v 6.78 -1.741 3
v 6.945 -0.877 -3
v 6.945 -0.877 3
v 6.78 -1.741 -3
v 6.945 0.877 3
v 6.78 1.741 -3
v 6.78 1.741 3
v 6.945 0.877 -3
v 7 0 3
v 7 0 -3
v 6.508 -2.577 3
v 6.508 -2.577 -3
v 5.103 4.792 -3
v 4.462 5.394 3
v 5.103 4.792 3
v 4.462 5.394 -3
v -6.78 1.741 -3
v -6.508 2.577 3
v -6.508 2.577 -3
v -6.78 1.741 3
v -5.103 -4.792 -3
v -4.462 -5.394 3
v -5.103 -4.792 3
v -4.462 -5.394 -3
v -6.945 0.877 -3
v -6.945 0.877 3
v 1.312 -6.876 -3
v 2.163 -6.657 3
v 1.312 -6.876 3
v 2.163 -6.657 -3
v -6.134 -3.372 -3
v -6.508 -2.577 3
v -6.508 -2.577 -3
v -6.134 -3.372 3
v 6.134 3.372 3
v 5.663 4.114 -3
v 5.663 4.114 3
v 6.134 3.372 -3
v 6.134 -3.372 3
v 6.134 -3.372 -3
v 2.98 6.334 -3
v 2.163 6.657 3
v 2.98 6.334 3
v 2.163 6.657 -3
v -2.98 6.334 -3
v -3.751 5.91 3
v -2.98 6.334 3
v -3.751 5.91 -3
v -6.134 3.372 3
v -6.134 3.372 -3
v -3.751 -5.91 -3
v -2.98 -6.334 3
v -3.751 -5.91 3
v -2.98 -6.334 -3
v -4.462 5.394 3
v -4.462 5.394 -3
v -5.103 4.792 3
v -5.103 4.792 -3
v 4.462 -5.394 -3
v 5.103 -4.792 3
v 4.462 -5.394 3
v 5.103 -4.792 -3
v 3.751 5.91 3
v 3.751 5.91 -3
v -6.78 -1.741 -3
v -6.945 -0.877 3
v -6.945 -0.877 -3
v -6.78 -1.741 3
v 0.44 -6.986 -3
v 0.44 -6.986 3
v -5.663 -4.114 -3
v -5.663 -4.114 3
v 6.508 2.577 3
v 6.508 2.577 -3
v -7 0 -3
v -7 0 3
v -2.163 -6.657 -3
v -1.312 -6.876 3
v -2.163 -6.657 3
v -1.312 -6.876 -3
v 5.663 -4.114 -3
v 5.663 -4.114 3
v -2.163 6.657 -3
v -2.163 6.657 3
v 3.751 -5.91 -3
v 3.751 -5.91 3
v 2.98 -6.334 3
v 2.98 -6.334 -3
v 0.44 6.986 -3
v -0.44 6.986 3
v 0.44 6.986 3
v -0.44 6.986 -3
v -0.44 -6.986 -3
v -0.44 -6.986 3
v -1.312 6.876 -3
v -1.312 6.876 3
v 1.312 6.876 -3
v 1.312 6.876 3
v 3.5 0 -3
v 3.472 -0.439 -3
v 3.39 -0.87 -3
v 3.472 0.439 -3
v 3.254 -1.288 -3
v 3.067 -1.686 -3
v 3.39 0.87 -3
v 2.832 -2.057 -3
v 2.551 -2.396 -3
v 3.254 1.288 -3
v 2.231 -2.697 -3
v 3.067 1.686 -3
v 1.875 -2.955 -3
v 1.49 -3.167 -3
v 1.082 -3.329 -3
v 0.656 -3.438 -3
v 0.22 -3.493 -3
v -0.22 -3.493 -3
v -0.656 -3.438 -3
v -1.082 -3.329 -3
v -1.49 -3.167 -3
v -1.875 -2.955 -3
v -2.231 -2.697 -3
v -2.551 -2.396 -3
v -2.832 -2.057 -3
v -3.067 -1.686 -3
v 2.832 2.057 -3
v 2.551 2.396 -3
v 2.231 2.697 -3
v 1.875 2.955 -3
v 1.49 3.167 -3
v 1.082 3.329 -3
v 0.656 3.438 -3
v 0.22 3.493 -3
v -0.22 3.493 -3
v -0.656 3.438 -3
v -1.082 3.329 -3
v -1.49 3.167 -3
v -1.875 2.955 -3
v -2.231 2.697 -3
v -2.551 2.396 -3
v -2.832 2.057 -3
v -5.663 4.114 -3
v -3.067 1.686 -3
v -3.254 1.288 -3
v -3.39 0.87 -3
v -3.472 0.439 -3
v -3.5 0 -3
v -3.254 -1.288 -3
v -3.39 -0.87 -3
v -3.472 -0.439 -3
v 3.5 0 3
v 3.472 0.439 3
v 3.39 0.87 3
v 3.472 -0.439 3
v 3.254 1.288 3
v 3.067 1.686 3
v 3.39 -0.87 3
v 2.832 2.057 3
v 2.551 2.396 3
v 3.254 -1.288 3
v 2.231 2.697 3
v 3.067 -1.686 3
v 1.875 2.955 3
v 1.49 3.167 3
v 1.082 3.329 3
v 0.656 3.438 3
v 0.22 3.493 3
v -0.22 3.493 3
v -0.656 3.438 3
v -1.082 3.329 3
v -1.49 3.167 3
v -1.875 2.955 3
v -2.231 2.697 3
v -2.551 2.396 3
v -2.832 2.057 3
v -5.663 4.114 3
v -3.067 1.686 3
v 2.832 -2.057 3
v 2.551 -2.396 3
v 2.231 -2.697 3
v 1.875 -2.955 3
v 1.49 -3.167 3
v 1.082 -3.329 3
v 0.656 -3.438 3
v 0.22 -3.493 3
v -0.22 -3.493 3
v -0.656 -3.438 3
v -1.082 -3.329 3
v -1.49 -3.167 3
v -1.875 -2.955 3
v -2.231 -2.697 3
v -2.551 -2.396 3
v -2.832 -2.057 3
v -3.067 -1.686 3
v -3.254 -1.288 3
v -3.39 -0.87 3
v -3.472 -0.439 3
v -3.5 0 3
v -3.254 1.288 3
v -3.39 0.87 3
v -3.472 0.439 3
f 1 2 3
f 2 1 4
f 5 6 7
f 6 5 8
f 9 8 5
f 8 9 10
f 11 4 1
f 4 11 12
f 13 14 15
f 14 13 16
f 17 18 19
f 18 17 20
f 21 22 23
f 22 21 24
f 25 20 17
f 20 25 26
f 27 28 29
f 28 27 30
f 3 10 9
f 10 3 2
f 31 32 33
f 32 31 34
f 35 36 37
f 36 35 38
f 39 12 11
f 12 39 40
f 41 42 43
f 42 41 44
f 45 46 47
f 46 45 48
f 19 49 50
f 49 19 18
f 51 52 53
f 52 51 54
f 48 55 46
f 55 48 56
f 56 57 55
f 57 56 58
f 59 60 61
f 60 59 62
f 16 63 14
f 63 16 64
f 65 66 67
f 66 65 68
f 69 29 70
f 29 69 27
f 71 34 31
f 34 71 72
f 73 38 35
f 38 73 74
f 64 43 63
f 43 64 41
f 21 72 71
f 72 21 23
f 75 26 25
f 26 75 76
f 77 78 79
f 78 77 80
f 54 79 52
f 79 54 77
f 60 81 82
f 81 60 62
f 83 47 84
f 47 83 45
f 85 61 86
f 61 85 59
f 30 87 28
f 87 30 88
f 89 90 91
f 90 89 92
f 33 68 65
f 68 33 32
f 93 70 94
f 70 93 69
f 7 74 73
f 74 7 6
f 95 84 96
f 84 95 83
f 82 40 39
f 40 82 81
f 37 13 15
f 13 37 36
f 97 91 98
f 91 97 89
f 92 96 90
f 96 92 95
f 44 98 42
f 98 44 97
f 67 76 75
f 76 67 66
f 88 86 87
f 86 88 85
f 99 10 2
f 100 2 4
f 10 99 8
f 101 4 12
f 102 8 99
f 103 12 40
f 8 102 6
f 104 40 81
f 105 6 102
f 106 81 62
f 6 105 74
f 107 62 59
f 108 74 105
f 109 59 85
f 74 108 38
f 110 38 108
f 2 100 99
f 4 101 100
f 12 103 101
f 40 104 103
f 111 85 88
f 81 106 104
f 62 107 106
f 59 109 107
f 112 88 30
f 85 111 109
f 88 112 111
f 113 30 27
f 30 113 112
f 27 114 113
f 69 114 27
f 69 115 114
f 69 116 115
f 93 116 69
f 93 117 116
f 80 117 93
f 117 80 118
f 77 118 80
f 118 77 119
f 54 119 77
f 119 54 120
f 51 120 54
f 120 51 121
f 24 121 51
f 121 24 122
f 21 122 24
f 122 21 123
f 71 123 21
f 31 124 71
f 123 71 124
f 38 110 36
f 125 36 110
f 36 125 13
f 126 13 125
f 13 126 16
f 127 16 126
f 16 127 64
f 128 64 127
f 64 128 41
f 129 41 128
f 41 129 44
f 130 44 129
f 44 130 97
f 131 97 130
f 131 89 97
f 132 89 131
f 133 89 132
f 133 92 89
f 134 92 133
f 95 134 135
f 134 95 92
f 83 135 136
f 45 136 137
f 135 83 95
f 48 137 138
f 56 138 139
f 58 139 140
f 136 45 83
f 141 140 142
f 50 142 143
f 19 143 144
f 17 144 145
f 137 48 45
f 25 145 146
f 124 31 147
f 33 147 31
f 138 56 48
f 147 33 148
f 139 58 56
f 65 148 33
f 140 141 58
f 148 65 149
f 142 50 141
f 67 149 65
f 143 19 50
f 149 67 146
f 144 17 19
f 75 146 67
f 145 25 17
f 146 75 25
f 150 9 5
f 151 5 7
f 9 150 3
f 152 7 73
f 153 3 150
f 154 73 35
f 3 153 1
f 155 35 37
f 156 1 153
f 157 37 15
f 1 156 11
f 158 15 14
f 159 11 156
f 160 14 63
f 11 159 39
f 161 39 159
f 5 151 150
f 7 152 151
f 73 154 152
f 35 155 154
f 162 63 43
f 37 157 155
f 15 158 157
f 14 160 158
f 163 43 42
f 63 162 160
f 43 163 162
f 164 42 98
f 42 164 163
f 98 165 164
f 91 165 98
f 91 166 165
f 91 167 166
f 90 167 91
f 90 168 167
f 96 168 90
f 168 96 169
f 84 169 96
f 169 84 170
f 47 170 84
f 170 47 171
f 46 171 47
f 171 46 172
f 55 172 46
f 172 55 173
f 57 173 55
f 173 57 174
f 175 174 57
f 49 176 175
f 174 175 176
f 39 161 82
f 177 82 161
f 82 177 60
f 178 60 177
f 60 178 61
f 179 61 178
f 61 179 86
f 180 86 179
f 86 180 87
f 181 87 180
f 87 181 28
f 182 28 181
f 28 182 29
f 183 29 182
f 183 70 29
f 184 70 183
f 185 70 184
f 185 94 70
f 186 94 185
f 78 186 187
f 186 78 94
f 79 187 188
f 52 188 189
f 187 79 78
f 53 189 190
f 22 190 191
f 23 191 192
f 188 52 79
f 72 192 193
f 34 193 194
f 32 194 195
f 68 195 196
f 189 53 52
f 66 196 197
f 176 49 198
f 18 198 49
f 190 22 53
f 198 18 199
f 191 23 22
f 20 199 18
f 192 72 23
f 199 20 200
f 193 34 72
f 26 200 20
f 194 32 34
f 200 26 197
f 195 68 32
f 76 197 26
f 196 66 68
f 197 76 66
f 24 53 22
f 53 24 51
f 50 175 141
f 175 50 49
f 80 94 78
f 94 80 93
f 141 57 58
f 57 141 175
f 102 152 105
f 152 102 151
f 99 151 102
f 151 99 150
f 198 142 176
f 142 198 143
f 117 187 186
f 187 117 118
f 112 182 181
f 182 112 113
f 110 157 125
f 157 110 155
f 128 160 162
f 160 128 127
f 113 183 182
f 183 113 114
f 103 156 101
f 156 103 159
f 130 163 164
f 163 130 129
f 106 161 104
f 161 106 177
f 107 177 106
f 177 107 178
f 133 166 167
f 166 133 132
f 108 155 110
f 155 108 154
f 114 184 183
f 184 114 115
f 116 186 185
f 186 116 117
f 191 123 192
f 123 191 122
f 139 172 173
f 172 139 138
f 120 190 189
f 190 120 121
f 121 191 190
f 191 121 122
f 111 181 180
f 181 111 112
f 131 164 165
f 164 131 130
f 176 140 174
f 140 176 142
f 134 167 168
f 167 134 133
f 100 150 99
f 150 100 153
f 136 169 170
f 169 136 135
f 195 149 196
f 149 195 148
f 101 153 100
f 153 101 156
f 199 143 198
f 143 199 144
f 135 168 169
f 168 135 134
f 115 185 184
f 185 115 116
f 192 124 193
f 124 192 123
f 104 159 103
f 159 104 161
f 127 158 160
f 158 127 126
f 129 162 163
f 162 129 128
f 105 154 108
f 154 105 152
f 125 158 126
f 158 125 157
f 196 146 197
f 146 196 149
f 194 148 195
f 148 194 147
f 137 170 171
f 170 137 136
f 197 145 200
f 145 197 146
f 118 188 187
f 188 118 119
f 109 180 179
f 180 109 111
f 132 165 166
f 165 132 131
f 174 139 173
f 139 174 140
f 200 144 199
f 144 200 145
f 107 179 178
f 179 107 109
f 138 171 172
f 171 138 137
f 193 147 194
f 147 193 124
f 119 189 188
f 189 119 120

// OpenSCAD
$fn = 50;


difference() {
	union() {
		translate(v = [0, 0, -3.0000000000]) {
			cylinder(h = 6, r = 7.0000000000);
		}
	}
	union() {
		translate(v = [0, 0, -100.0000000000]) {
			cylinder(h = 200, r = 3.5000000000);
		}
	}
}
